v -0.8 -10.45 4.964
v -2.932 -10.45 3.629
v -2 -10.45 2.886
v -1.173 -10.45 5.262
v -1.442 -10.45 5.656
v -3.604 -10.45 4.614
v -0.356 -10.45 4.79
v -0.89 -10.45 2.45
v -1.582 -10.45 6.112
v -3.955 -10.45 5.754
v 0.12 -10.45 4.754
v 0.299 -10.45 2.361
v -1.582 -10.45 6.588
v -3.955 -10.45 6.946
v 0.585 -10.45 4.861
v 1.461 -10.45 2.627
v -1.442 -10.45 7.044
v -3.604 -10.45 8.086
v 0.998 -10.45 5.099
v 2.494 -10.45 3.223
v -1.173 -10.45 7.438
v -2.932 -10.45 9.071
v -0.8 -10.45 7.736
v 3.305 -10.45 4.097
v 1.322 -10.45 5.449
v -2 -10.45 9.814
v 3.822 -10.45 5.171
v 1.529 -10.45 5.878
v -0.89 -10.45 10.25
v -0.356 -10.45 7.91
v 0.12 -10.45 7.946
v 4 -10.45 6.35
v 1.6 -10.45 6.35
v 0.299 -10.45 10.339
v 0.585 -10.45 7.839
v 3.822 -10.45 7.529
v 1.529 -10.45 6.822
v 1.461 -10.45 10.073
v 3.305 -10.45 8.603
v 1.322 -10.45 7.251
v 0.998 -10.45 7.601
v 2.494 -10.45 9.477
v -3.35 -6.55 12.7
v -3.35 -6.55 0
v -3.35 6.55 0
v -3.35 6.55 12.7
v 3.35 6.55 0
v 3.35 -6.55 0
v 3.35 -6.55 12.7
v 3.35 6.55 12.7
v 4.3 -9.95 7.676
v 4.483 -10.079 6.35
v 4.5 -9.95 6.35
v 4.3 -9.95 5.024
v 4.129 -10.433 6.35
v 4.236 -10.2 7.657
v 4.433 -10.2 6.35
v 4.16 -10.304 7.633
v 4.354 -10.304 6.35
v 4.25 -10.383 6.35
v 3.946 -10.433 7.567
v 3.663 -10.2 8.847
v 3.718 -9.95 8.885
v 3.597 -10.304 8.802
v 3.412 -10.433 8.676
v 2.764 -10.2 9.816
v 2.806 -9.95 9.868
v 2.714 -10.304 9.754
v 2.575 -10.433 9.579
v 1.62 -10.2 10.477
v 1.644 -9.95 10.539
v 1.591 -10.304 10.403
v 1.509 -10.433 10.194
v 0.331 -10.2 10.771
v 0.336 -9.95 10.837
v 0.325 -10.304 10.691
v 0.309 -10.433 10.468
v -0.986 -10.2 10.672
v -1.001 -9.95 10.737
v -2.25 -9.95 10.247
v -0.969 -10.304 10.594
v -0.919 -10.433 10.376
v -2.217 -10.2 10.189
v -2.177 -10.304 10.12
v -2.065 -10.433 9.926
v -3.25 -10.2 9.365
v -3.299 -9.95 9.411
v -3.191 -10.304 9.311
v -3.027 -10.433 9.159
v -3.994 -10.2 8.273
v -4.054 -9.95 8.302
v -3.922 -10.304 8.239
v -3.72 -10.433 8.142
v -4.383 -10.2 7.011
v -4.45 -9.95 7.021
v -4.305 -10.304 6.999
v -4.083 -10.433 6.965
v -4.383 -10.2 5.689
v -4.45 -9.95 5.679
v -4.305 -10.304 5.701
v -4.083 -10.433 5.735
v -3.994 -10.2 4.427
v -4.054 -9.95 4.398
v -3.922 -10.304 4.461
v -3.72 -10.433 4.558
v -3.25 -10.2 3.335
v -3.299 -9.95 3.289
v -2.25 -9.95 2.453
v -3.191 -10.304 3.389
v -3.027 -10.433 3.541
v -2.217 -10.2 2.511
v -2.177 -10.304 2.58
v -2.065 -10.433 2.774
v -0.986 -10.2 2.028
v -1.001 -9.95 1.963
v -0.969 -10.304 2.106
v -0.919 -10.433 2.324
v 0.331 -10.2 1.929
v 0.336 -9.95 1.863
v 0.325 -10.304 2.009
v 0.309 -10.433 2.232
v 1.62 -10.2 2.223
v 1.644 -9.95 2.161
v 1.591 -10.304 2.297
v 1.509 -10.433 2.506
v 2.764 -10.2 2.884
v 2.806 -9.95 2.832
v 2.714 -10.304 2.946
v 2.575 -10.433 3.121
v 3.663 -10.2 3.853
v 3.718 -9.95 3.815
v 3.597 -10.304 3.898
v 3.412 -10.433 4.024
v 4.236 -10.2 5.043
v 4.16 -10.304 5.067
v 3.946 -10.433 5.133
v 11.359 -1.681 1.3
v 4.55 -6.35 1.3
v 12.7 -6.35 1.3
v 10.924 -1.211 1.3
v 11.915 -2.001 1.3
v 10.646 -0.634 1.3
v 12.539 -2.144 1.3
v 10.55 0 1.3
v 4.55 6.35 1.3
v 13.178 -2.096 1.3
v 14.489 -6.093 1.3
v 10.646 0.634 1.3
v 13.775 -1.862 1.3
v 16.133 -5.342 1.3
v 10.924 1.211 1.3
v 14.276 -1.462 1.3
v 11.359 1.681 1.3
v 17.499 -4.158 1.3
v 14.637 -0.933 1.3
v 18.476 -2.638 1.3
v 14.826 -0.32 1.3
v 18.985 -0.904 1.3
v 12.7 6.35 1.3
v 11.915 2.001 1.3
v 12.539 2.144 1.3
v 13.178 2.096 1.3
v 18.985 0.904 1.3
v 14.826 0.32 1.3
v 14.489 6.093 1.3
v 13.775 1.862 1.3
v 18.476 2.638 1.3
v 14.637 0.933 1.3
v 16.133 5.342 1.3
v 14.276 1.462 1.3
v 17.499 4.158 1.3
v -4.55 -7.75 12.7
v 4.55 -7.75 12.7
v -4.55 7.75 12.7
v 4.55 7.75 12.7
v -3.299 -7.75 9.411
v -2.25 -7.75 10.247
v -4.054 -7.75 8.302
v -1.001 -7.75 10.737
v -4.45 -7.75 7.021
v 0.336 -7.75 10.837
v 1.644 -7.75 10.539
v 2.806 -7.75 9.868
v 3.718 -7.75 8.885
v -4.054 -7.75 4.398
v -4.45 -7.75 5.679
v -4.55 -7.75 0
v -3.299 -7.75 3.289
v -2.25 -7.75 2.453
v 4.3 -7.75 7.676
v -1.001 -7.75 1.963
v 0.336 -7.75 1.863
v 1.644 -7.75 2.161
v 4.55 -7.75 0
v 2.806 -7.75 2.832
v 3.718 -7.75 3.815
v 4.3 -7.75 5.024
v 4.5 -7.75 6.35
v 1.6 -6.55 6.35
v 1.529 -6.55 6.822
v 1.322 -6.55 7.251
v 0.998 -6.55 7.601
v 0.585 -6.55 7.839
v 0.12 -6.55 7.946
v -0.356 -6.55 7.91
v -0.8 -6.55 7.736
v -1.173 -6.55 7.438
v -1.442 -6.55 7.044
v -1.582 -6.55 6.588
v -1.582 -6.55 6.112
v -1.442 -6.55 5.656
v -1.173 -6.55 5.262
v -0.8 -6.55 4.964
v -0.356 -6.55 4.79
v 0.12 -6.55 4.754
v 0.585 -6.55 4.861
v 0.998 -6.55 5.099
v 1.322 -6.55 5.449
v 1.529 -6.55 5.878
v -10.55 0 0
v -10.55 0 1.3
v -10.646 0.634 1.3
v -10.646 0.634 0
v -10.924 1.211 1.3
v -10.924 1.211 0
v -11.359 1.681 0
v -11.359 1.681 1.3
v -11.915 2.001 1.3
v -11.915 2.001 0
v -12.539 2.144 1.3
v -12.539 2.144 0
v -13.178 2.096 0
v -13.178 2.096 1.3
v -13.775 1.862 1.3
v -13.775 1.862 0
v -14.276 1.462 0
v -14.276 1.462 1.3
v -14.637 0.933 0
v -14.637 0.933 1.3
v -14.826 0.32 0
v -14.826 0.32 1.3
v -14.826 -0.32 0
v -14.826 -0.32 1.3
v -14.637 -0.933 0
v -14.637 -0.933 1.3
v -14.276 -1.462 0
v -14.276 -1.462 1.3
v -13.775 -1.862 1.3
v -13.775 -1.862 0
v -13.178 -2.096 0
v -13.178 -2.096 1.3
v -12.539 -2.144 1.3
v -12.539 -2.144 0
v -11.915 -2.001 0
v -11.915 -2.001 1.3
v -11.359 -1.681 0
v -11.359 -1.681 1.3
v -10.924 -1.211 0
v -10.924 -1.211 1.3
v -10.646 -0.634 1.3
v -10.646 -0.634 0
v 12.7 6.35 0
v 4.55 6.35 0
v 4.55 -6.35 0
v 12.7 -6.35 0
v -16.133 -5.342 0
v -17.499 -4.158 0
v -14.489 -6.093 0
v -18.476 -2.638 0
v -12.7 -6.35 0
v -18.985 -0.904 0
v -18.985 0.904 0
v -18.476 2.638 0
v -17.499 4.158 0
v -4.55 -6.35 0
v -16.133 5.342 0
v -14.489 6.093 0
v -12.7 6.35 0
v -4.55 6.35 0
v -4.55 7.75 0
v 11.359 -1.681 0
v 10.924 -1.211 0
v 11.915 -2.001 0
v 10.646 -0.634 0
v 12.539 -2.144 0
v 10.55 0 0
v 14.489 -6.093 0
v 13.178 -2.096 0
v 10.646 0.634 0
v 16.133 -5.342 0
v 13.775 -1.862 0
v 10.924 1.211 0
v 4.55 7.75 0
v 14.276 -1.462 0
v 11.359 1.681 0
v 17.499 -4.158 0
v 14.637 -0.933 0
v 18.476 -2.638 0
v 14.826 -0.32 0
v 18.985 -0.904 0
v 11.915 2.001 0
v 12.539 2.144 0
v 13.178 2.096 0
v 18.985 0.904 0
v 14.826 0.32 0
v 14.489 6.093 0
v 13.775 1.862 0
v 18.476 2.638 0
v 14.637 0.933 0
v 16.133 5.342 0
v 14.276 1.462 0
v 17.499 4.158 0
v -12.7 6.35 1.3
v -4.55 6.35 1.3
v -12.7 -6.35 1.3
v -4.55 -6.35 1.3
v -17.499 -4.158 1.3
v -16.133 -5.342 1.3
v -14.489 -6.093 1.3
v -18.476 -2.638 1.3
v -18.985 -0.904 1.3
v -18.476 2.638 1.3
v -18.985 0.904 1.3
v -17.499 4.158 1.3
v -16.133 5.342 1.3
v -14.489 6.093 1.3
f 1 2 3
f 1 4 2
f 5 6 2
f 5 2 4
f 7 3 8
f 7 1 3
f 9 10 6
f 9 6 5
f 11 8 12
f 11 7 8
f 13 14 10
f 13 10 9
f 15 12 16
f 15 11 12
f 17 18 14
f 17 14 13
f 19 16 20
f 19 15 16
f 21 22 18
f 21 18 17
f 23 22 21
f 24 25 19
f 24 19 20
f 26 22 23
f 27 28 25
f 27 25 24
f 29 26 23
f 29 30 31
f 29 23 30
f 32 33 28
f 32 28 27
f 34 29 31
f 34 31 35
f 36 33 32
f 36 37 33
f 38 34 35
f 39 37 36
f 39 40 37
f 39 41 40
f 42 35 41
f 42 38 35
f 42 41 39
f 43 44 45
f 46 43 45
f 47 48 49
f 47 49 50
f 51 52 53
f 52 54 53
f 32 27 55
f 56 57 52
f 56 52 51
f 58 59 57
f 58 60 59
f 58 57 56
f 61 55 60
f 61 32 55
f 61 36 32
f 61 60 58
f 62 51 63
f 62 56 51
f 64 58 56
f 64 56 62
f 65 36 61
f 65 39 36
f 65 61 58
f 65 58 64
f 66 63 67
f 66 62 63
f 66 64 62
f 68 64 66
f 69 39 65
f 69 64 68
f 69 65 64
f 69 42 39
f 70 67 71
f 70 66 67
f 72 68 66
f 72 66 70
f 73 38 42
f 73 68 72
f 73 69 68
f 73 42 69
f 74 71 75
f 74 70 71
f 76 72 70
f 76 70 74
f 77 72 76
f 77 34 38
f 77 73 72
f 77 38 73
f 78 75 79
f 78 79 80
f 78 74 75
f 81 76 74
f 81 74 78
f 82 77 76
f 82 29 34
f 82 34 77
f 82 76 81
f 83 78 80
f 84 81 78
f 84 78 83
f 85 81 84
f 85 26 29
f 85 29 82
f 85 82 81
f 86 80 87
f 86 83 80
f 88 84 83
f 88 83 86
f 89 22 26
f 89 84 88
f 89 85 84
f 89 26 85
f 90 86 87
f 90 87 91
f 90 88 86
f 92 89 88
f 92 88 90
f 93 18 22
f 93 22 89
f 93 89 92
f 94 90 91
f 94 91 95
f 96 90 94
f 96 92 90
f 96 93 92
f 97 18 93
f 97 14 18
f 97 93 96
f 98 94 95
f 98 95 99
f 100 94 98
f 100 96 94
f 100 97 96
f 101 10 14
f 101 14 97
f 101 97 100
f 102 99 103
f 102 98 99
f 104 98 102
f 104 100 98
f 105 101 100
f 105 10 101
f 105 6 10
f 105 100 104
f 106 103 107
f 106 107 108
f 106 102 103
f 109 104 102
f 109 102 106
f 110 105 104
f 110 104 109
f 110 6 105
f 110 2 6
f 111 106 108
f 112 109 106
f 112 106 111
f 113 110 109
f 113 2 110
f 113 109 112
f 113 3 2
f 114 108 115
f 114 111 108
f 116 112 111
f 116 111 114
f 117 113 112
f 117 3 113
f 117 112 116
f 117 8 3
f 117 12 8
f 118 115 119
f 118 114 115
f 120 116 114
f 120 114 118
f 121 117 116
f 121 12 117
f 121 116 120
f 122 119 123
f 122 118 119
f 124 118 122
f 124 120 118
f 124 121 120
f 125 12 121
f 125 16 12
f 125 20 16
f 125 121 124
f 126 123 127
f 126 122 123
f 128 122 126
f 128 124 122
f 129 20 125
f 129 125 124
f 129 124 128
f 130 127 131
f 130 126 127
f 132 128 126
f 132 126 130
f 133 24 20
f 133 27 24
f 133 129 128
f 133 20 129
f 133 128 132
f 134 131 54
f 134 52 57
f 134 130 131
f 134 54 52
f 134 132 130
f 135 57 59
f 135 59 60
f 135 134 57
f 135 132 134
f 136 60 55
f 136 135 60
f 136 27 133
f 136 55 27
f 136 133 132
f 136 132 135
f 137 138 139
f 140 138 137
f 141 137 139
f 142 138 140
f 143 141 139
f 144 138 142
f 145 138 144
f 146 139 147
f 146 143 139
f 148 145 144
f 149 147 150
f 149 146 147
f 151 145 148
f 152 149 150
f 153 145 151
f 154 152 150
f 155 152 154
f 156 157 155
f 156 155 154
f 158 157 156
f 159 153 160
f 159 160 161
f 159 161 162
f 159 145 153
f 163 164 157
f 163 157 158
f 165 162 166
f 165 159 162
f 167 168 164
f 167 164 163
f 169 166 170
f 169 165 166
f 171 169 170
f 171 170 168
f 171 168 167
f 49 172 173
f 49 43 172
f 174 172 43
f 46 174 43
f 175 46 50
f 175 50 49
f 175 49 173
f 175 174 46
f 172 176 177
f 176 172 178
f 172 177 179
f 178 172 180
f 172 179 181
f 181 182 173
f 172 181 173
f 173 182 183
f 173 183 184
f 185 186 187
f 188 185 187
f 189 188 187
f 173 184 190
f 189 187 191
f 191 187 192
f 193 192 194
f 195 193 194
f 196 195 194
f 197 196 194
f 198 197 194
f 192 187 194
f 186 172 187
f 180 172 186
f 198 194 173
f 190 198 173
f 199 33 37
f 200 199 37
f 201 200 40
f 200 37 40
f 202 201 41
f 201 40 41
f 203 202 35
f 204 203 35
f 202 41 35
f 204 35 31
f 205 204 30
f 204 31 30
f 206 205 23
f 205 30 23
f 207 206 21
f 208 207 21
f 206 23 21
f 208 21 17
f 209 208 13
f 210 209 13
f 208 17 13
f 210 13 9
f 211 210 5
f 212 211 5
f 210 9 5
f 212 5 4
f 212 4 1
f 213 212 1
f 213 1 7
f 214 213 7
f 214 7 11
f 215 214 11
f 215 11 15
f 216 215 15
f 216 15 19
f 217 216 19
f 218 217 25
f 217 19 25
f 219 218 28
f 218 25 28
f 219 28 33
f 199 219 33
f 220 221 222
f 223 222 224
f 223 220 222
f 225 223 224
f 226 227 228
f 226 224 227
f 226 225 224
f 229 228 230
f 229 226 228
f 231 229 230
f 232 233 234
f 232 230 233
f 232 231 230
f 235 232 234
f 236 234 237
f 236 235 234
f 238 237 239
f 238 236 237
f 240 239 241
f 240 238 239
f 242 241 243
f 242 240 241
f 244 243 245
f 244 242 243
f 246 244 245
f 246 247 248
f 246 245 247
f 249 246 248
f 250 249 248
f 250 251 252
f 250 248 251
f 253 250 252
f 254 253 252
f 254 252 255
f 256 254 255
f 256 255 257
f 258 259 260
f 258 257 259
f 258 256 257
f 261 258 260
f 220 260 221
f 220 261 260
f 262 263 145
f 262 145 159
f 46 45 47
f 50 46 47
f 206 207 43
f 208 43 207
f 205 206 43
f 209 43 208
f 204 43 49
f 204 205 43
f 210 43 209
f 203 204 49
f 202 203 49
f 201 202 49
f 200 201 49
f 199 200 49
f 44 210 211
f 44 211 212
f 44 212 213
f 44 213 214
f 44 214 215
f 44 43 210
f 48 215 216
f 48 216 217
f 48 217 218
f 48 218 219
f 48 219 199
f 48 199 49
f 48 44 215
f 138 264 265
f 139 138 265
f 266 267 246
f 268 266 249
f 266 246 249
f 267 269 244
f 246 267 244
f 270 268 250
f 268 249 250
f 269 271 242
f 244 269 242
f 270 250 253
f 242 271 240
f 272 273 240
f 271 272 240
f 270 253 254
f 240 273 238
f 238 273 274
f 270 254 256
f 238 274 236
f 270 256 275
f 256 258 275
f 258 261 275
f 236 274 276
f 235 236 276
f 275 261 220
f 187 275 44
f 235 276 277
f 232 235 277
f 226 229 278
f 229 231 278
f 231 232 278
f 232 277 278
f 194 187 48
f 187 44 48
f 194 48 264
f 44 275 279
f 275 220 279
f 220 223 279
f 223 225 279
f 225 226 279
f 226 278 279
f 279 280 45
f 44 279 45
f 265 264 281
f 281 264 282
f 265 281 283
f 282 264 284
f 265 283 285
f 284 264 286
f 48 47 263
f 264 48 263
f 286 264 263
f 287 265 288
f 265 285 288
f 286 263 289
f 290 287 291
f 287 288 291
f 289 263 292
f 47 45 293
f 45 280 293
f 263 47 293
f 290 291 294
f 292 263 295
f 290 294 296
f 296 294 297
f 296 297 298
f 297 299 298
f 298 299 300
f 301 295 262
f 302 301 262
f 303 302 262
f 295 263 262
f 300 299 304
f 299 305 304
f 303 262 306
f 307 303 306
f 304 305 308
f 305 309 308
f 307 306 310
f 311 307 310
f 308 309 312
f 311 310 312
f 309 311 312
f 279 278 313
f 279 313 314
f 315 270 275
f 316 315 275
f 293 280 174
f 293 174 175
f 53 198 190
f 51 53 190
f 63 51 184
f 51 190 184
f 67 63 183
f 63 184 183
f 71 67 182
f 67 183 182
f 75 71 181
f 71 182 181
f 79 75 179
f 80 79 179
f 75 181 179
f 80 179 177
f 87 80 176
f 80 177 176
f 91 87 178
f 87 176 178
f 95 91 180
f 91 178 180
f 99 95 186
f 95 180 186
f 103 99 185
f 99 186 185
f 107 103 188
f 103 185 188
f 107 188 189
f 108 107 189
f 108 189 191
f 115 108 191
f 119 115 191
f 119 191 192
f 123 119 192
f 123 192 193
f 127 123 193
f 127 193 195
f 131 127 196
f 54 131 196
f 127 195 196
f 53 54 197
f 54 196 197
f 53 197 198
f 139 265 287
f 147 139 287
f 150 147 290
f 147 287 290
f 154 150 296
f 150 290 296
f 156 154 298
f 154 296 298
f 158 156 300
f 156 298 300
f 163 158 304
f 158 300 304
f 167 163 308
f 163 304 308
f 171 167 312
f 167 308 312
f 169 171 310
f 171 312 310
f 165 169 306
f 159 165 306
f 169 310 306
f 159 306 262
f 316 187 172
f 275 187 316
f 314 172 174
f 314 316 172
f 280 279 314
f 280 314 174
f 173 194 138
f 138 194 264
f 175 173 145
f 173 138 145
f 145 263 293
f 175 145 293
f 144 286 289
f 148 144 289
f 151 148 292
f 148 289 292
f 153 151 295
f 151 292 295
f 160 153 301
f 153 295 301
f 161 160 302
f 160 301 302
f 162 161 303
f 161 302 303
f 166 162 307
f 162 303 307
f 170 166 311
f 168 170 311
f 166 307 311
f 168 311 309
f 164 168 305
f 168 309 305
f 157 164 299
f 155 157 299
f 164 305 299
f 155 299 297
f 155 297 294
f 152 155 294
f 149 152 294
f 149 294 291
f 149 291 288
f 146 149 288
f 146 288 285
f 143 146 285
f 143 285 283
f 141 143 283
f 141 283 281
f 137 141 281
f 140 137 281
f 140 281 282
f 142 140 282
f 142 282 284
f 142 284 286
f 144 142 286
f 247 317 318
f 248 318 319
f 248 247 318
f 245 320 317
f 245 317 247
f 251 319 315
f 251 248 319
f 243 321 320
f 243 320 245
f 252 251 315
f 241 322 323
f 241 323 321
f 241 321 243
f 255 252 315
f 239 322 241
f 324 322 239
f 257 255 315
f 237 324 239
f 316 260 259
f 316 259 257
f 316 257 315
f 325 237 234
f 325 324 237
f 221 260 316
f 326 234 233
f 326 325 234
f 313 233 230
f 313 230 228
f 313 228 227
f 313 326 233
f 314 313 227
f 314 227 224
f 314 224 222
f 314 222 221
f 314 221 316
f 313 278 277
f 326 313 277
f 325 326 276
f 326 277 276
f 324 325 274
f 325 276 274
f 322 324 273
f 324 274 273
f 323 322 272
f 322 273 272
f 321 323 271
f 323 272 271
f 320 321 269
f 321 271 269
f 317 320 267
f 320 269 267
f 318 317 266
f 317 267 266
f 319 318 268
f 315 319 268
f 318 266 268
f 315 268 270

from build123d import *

# Parameters (mm, degrees)
PAD_DEPTH       = 1.3
SKETCH001_W     = 9.1
SKETCH001_H     = 15.5
PAD001_DEPTH    = 12.7
SKETCH002_W     = 6.7
SKETCH002_H     = 13.1
POCKET_DEPTH    = 12.701
SKETCH003_R     = 2.15
POCKET001_DEPTH = 98.797458
SKETCH004_R     = 4.5
PAD002_DEPTH    = 2.7
SKETCH005_R     = 1.6
POCKET002_DEPTH = 3.9
FILLET_R        = 0.5


with BuildPart() as part:
    # Sketch → Pad (new body)
    with BuildSketch(Plane.XY):
        with BuildLine():
            ThreePointArc((-12.7, 6.35), (-19.05, 0), (-12.7, -6.35))
            Line((-12.7, -6.35), (12.7, -6.35))
            ThreePointArc((12.7, -6.35), (19.05, 0), (12.7, 6.35))
            Line((-12.7, 6.35), (12.7, 6.35))
        make_face()
    extrude(amount=PAD_DEPTH)

    # Sketch001 → Pad001 (join)
    with BuildSketch(Plane.XY):
        Rectangle(SKETCH001_W, SKETCH001_H)
    extrude(amount=PAD001_DEPTH)

    # Sketch002 → Pocket (cut, through all)
    with BuildSketch(Plane.XY):
        Rectangle(SKETCH002_W, SKETCH002_H)
    extrude(amount=POCKET_DEPTH, mode=Mode.SUBTRACT)

    # Sketch003 → Pocket001 (cut, through all)
    with BuildSketch(Plane.XY):
        with Locations((-12.7, 0)):
            Circle(SKETCH003_R)
    pocket001 = extrude(amount=POCKET001_DEPTH, mode=Mode.SUBTRACT)

    # Mirrored: Pocket001 across Sketch003 V_Axis
    add(pocket001.mirror(Plane(origin=(0, 0, 0), x_dir=(0, 0, 1), z_dir=(1, 0, 0))), mode=Mode.SUBTRACT)

    # Sketch004 (on Face11 of Mirrored) → Pad002 (join)
    with BuildSketch(Plane.XZ.offset(7.75)):
        with Locations((0, 6.35)):
            Circle(SKETCH004_R)
    extrude(amount=PAD002_DEPTH)

    # Sketch005 (on Face25 of Pad002) → Pocket002 (cut)
    with BuildSketch(Plane.XZ.offset(10.45)):
        with Locations((0, 6.35)):
            Circle(SKETCH005_R)
    extrude(amount=-POCKET002_DEPTH, mode=Mode.SUBTRACT)

    # Fillet
    fillet_edges = [part.edges().sort_by_distance(p)[0] for p in [
        (-4.5, -10.45, 6.35),
    ]]
    fillet(fillet_edges, radius=FILLET_R)


solid = part.part
